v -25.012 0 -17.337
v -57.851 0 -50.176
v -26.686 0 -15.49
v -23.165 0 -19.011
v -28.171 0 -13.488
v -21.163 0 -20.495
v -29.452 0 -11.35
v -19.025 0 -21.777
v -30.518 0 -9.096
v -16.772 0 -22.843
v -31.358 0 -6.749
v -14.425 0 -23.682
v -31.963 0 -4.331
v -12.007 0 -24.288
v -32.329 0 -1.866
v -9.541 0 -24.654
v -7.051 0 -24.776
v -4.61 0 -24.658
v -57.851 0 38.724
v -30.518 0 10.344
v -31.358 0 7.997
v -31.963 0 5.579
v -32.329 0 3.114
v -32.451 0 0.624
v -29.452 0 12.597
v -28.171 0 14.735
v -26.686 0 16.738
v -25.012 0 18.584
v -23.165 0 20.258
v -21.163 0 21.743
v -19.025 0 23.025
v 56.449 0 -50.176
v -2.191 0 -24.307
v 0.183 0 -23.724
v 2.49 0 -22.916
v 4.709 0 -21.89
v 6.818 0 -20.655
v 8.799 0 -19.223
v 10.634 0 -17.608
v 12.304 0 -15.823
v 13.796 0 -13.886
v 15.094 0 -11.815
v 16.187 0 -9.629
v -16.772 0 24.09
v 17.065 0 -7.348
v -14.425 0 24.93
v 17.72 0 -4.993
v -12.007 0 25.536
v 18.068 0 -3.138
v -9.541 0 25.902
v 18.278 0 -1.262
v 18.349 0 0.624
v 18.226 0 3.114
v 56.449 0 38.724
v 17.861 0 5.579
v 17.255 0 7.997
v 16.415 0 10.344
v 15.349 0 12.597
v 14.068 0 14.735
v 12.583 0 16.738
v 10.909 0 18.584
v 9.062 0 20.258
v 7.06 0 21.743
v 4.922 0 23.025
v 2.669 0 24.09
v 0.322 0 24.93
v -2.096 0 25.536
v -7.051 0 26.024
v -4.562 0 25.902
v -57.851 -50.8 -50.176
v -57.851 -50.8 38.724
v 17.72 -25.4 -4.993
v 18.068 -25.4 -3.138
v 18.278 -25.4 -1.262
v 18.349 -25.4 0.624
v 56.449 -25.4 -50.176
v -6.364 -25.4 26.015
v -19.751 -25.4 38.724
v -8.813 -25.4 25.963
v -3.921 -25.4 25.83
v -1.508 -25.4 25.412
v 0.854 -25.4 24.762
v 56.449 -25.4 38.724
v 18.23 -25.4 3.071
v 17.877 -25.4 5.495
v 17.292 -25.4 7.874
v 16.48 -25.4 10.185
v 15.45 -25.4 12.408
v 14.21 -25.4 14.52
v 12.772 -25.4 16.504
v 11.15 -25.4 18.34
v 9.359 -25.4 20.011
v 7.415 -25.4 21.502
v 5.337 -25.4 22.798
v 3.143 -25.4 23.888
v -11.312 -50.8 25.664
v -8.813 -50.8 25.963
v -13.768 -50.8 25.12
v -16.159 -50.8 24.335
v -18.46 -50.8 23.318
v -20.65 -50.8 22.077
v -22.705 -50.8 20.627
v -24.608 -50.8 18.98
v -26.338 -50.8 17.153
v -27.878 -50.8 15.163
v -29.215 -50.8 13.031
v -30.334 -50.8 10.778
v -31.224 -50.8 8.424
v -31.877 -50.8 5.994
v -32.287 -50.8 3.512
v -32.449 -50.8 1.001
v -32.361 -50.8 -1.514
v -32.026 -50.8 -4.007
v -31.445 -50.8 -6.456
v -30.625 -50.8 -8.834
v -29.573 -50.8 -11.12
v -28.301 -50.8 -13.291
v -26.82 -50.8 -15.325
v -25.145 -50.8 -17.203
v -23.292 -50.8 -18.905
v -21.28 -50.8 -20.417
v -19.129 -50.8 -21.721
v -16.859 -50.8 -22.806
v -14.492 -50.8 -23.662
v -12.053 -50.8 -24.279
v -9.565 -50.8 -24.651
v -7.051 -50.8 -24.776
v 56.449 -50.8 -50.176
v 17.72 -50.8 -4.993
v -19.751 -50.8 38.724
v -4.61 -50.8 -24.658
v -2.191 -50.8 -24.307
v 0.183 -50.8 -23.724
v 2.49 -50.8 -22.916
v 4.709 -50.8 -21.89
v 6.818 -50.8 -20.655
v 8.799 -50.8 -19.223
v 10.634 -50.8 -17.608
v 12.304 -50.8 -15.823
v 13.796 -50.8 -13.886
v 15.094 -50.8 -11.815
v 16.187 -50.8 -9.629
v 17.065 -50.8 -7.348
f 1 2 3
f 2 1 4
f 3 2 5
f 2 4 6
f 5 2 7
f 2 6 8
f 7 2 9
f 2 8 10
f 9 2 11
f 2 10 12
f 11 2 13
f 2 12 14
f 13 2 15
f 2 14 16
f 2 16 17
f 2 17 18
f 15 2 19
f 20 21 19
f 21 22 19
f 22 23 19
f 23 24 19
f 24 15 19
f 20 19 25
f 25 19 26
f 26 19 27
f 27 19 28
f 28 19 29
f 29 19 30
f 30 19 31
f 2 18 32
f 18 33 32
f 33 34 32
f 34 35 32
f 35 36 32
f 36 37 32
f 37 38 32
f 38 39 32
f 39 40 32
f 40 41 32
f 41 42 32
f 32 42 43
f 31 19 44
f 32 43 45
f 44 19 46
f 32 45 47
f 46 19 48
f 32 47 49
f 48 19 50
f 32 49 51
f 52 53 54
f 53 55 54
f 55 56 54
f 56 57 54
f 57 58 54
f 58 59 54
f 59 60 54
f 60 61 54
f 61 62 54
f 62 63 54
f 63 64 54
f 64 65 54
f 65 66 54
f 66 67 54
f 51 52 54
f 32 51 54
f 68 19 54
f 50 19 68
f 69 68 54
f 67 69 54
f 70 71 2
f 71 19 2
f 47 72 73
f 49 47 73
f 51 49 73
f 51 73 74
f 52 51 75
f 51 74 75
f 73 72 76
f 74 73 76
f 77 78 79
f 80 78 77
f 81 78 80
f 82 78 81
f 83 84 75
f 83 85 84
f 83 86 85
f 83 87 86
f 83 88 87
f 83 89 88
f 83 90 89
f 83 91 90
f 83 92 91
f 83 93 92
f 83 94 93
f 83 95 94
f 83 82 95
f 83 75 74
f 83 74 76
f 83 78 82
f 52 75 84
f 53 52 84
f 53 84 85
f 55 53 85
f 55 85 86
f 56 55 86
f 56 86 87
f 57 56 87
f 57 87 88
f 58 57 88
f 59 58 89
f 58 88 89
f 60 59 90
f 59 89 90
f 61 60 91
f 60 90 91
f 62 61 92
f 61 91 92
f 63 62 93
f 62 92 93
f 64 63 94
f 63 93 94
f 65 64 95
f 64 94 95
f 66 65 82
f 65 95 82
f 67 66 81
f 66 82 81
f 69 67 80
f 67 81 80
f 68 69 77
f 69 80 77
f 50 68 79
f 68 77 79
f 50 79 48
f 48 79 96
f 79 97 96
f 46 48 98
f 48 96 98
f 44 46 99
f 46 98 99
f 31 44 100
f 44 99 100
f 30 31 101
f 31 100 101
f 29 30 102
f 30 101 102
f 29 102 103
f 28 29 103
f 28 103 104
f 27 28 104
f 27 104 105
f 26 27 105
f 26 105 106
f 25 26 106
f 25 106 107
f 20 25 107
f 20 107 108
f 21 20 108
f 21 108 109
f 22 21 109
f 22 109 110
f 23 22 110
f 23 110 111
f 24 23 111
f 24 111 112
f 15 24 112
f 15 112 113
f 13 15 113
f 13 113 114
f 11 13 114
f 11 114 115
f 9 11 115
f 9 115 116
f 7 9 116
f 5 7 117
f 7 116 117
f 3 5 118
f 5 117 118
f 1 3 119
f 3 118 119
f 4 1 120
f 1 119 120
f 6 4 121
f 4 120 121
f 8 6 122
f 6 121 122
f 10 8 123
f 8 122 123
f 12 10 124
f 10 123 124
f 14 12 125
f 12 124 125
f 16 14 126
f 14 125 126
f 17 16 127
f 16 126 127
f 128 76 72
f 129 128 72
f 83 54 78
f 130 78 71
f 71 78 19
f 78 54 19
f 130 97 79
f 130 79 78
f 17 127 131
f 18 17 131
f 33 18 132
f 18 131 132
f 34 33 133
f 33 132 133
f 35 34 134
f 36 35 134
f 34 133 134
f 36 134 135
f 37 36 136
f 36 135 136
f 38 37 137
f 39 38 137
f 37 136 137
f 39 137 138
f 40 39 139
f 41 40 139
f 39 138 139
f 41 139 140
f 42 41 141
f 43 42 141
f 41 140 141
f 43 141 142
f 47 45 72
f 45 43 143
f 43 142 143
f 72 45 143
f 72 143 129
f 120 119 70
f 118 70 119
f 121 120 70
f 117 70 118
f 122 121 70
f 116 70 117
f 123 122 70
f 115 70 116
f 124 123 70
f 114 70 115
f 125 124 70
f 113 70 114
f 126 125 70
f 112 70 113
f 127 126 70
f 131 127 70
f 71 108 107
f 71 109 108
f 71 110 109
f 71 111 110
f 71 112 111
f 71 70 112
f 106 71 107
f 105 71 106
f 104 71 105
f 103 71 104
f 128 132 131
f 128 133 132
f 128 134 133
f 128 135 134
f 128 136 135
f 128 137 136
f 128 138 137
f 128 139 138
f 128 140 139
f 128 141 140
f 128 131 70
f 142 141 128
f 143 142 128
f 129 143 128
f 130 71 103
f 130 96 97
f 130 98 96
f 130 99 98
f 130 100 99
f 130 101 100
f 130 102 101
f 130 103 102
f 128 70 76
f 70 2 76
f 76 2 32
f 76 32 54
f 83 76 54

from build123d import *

# Parameters (mm, degrees)
F0_W     = 114.3
F0_H     = 88.9
F1_DEPTH = 25.4
F3_DEPTH = 25.4
F5_DEPTH = 50.8


with BuildPart() as f1:
    # F0 (on Front) → F1 (new body)
    with BuildSketch(Plane.XZ):
        with Locations((-0.7014218356, -5.7260454797)):
            Rectangle(F0_W, F0_H)
    extrude(amount=F1_DEPTH)

    # F2 (on face) → F3 (join)
    with BuildSketch(Plane.XZ.offset(25.4)):
        Polygon((-19.7514218356, 38.7239545203), (-57.8514218356, 38.7239545203), (-57.8514218356, -50.1760454797), (56.4485781644, -50.1760454797), align=None)
    extrude(amount=F3_DEPTH)

    # F4 (on face) → F5 (cut)
    with BuildSketch(Plane.XZ.offset(50.8)):
        with BuildLine():
            ThreePointArc((-8.8132691571, 25.9627763954), (-25.6243984679, 17.9503661228), (-32.4514218356, 0.6239545203))
            Line((-32.4514218356, 0.6239545203), (-7.0514218356, 0.6239545203))
            Line((-7.0514218356, 0.6239545203), (-7.0514218356, 23.9072878537))
            Line((-7.0514218356, 23.9072878537), (-8.8132691571, 25.9627763954))
        make_face()
        with BuildLine():
            ThreePointArc((-32.4514218356, 0.6239545203), (-25.0119340777, -17.3365577218), (-7.0514218356, -24.7760454797))
            Line((-7.0514218356, -24.7760454797), (-7.0514218356, 0.6239545203))
            Line((-7.0514218356, 0.6239545203), (-32.4514218356, 0.6239545203))
        make_face()
        with BuildLine():
            Line((-7.0514218356, 0.6239545203), (-7.0514218356, -24.7760454797))
            ThreePointArc((-7.0514218356, -24.7760454797), (8.7994722887, -19.2231902481), (17.7198372506, -4.9925144135))
            Line((17.7198372506, -4.9925144135), (-7.0514218356, 23.9072878537))
            Line((-7.0514218356, 23.9072878537), (-7.0514218356, 0.6239545203))
        make_face()
        with BuildLine():
            Line((-7.0514218356, 23.9072878537), (17.7198372506, -4.9925144135))
            ThreePointArc((17.7198372506, -4.9925144135), (18.1909035405, -2.2018214095), (18.3485781644, 0.6239545203))
            ThreePointArc((18.3485781644, 0.6239545203), (10.2749897668, 19.1969311526), (-8.8132691571, 25.9627763954))
            Line((-8.8132691571, 25.9627763954), (-7.0514218356, 23.9072878537))
        make_face()
    extrude(amount=-F5_DEPTH, mode=Mode.SUBTRACT)


solid = f1.part
